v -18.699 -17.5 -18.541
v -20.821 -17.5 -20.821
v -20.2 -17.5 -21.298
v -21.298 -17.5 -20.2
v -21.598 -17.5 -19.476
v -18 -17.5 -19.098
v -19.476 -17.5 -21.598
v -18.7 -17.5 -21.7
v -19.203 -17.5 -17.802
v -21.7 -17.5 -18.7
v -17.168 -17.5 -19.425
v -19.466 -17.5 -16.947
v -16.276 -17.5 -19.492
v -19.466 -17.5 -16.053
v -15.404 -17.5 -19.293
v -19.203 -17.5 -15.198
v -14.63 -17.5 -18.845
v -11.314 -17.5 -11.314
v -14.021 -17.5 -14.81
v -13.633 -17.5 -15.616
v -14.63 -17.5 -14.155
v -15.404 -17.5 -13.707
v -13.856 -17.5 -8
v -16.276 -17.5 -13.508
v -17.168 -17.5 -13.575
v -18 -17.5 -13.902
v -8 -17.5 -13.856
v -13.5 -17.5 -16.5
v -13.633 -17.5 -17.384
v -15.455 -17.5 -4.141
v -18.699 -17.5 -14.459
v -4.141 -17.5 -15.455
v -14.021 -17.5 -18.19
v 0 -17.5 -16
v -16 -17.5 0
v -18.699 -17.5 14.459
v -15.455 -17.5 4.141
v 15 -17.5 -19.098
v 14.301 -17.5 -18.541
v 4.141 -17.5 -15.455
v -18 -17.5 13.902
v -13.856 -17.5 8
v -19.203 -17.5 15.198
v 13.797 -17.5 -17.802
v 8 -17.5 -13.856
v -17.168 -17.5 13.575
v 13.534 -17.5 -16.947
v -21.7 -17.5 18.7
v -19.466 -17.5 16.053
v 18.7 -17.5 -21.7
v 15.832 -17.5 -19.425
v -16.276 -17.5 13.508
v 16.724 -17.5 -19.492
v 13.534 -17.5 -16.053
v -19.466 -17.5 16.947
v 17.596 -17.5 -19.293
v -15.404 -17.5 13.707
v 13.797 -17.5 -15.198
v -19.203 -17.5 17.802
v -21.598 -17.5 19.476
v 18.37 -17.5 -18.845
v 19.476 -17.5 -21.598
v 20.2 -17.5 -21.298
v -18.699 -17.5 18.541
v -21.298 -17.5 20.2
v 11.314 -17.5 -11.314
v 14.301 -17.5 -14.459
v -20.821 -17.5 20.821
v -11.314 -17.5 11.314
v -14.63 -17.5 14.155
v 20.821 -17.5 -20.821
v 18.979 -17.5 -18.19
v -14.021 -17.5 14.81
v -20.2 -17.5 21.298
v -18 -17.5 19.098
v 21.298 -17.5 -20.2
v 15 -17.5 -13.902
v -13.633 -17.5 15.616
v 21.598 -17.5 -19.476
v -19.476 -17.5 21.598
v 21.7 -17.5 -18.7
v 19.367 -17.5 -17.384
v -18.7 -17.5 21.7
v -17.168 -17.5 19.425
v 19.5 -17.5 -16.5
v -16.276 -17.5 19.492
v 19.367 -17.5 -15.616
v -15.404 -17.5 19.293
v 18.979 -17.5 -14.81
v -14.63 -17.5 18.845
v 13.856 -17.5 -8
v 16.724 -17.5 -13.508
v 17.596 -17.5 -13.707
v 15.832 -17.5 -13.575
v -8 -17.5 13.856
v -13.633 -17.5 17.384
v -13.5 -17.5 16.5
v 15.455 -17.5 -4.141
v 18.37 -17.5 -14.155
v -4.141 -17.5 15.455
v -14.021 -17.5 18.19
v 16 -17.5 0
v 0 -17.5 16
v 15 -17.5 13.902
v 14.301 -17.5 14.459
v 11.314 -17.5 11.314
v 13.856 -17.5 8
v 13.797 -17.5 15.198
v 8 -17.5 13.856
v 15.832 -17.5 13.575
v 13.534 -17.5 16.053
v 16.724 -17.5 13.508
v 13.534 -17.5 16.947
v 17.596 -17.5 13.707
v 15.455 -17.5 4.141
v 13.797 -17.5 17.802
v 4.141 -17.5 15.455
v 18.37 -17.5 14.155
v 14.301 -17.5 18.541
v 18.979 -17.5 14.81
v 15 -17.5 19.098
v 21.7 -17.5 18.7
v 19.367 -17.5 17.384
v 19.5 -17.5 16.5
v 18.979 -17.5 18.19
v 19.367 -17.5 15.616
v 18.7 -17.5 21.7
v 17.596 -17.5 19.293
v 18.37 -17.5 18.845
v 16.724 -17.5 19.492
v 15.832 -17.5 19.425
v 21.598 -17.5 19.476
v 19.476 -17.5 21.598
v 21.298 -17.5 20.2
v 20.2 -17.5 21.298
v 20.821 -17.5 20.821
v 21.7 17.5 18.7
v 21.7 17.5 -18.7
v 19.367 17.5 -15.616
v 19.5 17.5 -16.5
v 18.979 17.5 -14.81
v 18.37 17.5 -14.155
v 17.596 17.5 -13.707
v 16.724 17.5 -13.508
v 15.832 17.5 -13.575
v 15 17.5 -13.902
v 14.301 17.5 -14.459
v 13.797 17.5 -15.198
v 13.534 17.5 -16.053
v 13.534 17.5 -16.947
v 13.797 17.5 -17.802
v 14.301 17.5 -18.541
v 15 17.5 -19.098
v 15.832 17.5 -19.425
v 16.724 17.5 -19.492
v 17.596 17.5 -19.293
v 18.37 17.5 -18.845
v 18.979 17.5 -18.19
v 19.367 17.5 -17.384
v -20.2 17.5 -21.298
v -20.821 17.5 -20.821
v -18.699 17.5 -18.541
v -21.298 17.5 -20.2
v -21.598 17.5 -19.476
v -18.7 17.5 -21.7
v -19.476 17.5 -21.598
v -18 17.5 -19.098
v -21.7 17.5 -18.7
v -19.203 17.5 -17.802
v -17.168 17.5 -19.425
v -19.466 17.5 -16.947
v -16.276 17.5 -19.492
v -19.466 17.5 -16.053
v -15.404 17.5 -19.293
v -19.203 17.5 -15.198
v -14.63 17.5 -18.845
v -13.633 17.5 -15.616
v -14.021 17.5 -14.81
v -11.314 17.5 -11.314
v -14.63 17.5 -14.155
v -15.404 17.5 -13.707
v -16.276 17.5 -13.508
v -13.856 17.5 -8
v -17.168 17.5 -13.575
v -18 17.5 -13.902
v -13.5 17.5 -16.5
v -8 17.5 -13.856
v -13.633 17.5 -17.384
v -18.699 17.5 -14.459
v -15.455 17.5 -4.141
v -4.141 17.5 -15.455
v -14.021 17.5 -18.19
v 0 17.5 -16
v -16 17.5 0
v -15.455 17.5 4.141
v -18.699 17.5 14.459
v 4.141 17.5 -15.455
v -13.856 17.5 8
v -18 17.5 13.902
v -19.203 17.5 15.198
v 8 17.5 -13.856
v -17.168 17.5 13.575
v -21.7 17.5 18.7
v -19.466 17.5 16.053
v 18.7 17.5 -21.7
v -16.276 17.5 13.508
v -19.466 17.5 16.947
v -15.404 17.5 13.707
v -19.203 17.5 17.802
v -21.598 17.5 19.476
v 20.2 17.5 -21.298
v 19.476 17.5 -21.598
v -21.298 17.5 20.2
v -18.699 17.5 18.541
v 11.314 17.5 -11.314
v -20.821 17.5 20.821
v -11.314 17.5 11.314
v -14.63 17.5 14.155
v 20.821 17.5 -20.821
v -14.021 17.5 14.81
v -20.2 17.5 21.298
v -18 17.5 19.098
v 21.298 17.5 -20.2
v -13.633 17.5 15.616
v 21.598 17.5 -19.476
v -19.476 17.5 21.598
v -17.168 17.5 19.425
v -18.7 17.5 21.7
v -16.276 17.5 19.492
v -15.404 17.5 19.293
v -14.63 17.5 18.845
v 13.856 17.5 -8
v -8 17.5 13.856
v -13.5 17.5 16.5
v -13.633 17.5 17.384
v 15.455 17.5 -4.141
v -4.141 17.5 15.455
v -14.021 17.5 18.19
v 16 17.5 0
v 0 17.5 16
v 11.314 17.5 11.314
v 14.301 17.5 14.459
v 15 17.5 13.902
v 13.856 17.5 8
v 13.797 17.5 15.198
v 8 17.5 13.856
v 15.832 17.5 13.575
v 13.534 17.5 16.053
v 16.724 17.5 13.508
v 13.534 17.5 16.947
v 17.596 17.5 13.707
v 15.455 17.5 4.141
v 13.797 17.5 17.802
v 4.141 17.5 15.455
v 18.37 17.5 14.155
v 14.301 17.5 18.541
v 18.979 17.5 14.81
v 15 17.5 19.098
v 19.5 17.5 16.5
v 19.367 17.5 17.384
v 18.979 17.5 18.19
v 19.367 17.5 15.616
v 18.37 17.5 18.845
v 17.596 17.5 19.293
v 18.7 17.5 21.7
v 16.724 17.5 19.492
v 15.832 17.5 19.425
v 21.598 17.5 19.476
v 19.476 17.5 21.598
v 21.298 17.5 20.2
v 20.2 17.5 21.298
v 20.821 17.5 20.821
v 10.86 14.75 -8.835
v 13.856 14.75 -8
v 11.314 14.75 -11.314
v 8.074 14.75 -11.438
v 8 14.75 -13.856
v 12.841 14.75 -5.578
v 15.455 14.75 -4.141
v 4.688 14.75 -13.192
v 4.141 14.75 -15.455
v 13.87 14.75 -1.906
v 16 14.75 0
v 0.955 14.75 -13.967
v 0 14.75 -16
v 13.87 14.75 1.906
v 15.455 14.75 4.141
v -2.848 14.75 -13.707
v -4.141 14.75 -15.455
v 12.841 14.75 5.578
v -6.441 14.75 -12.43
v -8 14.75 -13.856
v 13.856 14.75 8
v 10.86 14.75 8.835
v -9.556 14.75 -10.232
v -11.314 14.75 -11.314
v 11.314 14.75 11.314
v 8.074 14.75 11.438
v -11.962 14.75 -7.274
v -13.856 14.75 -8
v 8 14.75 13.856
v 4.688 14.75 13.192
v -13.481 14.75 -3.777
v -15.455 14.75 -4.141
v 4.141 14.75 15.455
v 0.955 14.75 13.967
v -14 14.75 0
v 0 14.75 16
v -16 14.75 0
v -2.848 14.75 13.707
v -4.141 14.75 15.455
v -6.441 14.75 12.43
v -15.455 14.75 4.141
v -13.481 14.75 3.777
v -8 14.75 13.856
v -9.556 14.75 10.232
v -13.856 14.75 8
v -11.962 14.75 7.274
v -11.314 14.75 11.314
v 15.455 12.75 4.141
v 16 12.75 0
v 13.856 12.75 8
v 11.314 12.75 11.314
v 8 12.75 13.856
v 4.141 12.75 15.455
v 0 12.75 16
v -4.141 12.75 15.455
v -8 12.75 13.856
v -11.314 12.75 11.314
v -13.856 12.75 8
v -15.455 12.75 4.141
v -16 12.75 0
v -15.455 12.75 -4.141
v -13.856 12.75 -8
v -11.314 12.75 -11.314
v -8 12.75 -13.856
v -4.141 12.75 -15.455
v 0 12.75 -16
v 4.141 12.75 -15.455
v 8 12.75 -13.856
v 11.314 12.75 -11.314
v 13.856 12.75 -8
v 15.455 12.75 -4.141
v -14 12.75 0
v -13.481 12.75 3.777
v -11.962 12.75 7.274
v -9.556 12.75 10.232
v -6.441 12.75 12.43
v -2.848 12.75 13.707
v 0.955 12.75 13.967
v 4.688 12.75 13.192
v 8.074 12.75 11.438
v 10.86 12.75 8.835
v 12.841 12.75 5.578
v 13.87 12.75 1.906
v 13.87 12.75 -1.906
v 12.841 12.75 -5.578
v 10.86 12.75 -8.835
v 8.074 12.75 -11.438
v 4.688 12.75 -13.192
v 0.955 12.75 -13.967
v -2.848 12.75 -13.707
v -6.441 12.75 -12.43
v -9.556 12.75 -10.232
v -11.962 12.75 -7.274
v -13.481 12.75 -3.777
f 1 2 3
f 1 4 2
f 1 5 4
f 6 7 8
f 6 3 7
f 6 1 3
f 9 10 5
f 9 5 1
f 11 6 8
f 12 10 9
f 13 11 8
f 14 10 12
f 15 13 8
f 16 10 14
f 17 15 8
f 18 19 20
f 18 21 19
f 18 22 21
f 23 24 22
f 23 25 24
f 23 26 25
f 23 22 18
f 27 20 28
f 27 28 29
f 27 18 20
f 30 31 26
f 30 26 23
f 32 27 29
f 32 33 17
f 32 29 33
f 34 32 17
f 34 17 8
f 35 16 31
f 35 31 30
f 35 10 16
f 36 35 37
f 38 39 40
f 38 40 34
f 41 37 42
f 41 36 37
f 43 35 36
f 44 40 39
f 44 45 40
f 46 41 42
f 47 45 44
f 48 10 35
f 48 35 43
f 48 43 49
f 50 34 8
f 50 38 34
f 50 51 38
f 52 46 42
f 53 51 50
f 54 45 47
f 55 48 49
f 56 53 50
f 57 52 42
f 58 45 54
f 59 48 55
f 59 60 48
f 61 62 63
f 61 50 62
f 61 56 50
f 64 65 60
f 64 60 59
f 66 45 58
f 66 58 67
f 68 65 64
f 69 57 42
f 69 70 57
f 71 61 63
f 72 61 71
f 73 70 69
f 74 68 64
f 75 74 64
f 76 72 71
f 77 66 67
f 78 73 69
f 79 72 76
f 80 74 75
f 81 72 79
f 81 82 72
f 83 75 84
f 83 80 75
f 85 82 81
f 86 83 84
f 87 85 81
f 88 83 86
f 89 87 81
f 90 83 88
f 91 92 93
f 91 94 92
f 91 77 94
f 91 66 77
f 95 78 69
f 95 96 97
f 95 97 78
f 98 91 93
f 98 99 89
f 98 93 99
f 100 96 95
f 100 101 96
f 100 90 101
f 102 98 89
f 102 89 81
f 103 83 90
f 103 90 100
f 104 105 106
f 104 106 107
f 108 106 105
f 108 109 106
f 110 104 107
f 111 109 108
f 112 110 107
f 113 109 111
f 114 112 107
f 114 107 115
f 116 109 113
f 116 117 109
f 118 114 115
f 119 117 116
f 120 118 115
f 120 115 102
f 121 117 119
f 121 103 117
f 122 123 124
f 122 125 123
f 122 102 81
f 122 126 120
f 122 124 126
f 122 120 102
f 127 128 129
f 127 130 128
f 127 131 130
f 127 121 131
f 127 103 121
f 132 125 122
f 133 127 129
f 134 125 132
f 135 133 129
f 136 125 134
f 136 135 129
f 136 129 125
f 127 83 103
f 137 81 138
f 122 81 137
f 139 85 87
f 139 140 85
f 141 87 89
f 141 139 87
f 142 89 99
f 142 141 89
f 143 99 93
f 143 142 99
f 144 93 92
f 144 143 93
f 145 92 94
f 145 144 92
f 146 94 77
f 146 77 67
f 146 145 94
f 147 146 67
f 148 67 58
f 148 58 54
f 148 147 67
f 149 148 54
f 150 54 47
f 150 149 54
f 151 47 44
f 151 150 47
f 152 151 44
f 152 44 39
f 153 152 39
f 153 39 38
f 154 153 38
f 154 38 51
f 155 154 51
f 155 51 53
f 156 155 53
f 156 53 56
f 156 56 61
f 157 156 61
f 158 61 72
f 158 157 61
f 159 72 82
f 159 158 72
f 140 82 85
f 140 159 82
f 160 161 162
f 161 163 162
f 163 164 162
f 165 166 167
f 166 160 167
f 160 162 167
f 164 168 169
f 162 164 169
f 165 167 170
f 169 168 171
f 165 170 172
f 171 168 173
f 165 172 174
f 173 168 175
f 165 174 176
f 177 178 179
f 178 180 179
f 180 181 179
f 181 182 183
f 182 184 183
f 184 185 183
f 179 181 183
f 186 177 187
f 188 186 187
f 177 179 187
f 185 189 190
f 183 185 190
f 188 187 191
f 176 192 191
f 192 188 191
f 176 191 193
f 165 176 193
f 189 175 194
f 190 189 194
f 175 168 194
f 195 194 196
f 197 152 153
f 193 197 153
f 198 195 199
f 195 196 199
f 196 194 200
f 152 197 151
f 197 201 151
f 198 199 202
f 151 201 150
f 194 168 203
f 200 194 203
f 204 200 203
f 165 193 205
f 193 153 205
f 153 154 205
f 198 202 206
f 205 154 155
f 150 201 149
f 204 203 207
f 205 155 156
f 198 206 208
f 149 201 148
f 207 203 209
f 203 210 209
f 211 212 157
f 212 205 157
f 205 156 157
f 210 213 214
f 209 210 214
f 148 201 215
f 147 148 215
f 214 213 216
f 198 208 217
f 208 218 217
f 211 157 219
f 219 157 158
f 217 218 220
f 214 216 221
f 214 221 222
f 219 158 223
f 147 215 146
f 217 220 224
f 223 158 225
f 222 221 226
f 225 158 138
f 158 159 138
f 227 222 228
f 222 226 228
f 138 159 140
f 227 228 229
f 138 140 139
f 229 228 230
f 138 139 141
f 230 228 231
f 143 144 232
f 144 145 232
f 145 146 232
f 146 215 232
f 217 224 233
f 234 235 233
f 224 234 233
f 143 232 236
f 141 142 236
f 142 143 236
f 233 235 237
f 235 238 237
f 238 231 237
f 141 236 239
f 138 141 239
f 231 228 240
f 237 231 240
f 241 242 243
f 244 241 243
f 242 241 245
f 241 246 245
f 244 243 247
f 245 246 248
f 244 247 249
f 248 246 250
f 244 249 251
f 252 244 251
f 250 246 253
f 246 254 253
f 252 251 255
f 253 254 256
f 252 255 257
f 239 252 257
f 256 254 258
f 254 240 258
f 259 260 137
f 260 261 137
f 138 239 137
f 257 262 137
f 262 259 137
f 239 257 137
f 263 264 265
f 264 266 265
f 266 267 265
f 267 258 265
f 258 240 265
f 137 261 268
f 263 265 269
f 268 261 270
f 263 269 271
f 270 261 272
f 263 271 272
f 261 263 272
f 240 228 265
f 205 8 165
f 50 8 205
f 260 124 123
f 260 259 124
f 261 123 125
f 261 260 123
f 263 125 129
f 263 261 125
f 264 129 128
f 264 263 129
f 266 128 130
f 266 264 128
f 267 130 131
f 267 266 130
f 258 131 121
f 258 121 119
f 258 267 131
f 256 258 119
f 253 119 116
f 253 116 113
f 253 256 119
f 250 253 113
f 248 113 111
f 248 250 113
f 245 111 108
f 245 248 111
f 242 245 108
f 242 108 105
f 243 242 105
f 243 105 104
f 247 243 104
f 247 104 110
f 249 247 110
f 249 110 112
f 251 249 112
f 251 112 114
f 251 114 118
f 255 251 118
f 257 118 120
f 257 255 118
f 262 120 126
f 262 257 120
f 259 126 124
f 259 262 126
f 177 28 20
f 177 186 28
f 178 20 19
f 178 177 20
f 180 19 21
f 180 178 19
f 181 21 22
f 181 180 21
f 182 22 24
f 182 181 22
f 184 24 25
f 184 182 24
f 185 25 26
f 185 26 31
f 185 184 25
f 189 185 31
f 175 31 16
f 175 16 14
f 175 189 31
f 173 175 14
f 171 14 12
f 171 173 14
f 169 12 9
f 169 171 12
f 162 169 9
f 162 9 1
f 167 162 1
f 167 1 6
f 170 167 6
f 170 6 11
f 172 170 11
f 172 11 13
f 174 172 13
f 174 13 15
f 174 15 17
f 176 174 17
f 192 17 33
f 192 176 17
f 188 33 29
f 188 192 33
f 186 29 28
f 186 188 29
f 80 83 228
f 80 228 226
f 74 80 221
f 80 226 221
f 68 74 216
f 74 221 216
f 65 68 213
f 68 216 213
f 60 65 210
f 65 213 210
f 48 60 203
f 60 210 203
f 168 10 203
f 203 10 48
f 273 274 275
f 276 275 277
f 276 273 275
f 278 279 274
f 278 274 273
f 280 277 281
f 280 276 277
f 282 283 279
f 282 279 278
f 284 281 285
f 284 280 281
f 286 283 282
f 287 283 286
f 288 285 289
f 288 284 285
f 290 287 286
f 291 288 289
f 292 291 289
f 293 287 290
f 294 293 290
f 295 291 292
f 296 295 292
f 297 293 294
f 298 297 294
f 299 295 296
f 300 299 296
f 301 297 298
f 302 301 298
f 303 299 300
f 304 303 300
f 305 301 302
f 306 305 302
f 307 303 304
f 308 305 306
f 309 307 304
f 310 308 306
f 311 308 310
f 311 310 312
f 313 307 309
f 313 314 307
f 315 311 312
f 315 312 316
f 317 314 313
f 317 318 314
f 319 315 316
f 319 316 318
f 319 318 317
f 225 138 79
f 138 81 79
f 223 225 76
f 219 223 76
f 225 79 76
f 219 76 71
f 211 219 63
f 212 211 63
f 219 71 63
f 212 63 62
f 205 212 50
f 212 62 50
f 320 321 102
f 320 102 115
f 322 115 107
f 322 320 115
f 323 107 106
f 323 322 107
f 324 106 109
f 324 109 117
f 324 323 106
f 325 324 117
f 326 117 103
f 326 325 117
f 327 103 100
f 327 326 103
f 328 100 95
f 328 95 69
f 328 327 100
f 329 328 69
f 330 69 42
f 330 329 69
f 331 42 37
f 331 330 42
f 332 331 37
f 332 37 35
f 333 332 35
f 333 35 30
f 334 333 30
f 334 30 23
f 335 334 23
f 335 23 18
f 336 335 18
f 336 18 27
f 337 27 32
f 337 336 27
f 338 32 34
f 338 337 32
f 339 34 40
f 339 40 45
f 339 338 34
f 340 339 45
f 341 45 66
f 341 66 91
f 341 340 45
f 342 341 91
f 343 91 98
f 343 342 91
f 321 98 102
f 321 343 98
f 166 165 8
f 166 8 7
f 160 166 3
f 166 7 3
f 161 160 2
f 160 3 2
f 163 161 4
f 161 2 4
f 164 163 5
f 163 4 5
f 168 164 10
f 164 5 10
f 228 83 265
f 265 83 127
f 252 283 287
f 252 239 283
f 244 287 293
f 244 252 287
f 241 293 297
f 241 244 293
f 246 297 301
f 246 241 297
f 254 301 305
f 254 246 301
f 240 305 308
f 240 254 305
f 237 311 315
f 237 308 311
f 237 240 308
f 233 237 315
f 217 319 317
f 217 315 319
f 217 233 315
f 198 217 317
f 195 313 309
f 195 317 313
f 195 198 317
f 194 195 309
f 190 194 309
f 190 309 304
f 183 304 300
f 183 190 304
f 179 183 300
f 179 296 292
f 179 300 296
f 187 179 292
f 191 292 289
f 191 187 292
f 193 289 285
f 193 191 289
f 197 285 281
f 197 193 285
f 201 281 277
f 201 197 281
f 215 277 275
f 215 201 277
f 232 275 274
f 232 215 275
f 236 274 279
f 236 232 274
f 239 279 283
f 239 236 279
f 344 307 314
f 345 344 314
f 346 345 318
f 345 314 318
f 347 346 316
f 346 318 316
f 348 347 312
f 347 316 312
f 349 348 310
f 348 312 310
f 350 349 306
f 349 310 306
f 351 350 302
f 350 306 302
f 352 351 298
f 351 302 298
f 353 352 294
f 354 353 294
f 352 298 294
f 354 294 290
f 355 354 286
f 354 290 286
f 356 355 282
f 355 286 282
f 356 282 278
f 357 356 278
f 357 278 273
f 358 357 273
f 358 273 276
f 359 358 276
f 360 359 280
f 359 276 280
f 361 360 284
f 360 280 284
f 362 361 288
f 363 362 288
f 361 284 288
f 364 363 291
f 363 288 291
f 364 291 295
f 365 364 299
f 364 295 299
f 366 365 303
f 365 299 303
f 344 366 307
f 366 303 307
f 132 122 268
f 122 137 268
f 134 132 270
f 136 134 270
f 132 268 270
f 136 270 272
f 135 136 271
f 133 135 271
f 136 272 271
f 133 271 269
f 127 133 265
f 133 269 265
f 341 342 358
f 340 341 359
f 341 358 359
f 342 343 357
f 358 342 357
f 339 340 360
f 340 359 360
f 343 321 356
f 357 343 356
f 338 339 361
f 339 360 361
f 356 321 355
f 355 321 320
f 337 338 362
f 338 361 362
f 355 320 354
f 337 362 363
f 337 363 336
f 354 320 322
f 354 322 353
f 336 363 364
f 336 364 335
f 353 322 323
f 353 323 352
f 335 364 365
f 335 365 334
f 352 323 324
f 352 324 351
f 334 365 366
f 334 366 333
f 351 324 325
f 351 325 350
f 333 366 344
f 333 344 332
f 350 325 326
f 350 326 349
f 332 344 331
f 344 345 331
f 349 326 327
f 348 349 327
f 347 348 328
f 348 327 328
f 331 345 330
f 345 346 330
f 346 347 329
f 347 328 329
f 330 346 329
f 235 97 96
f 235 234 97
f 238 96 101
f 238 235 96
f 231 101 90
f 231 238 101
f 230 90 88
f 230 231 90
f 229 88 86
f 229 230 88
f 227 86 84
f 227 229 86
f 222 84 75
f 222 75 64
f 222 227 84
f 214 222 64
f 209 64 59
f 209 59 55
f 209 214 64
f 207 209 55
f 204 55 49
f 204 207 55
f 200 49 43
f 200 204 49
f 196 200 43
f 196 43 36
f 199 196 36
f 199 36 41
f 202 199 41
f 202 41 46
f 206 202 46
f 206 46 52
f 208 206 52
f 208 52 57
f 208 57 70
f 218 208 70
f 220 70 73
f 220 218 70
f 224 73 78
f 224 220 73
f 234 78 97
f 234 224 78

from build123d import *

# Parameters (mm, degrees)
F0_W     = 43.4
F0_H     = 43.4
F0_R     = 3
F0_R_2   = 16
F1_DEPTH = 17.5
F3_R     = 16
F3_R_2   = 14
F4_DEPTH = 2
F5_R     = 3


with BuildPart() as f1:
    # F0 (on Front) → F1 (new body, symmetric)
    with BuildSketch(Plane.XZ):
        Rectangle(F0_W, F0_H)
        with Locations((-16.5, -16.5)):
            Circle(F0_R, mode=Mode.SUBTRACT)
        with Locations((16.5, -16.5)):
            Circle(F0_R, mode=Mode.SUBTRACT)
        with Locations((-16.5, 16.5)):
            Circle(F0_R, mode=Mode.SUBTRACT)
        Circle(F0_R_2, mode=Mode.SUBTRACT)
        with Locations((16.5, 16.5)):
            Circle(F0_R, mode=Mode.SUBTRACT)
    extrude(amount=F1_DEPTH, both=True)

    # F3 (on offset) → F4 (join)
    with BuildSketch(Plane(origin=(0, 14.75, 0), x_dir=(-1, 0, 0), z_dir=(0, 1, 0))):
        Circle(F3_R)
        Circle(F3_R_2, mode=Mode.SUBTRACT)
    extrude(amount=-F4_DEPTH)

    # F5
    f5_edges = [f1.edges().sort_by_distance(p)[0] for p in [
        (-21.7, 0, 21.7),
        (21.7, 0, 21.7),
        (21.7, 0, -21.7),
        (-21.7, 0, -21.7),
    ]]
    fillet(f5_edges, radius=F5_R)


solid = f1.part
